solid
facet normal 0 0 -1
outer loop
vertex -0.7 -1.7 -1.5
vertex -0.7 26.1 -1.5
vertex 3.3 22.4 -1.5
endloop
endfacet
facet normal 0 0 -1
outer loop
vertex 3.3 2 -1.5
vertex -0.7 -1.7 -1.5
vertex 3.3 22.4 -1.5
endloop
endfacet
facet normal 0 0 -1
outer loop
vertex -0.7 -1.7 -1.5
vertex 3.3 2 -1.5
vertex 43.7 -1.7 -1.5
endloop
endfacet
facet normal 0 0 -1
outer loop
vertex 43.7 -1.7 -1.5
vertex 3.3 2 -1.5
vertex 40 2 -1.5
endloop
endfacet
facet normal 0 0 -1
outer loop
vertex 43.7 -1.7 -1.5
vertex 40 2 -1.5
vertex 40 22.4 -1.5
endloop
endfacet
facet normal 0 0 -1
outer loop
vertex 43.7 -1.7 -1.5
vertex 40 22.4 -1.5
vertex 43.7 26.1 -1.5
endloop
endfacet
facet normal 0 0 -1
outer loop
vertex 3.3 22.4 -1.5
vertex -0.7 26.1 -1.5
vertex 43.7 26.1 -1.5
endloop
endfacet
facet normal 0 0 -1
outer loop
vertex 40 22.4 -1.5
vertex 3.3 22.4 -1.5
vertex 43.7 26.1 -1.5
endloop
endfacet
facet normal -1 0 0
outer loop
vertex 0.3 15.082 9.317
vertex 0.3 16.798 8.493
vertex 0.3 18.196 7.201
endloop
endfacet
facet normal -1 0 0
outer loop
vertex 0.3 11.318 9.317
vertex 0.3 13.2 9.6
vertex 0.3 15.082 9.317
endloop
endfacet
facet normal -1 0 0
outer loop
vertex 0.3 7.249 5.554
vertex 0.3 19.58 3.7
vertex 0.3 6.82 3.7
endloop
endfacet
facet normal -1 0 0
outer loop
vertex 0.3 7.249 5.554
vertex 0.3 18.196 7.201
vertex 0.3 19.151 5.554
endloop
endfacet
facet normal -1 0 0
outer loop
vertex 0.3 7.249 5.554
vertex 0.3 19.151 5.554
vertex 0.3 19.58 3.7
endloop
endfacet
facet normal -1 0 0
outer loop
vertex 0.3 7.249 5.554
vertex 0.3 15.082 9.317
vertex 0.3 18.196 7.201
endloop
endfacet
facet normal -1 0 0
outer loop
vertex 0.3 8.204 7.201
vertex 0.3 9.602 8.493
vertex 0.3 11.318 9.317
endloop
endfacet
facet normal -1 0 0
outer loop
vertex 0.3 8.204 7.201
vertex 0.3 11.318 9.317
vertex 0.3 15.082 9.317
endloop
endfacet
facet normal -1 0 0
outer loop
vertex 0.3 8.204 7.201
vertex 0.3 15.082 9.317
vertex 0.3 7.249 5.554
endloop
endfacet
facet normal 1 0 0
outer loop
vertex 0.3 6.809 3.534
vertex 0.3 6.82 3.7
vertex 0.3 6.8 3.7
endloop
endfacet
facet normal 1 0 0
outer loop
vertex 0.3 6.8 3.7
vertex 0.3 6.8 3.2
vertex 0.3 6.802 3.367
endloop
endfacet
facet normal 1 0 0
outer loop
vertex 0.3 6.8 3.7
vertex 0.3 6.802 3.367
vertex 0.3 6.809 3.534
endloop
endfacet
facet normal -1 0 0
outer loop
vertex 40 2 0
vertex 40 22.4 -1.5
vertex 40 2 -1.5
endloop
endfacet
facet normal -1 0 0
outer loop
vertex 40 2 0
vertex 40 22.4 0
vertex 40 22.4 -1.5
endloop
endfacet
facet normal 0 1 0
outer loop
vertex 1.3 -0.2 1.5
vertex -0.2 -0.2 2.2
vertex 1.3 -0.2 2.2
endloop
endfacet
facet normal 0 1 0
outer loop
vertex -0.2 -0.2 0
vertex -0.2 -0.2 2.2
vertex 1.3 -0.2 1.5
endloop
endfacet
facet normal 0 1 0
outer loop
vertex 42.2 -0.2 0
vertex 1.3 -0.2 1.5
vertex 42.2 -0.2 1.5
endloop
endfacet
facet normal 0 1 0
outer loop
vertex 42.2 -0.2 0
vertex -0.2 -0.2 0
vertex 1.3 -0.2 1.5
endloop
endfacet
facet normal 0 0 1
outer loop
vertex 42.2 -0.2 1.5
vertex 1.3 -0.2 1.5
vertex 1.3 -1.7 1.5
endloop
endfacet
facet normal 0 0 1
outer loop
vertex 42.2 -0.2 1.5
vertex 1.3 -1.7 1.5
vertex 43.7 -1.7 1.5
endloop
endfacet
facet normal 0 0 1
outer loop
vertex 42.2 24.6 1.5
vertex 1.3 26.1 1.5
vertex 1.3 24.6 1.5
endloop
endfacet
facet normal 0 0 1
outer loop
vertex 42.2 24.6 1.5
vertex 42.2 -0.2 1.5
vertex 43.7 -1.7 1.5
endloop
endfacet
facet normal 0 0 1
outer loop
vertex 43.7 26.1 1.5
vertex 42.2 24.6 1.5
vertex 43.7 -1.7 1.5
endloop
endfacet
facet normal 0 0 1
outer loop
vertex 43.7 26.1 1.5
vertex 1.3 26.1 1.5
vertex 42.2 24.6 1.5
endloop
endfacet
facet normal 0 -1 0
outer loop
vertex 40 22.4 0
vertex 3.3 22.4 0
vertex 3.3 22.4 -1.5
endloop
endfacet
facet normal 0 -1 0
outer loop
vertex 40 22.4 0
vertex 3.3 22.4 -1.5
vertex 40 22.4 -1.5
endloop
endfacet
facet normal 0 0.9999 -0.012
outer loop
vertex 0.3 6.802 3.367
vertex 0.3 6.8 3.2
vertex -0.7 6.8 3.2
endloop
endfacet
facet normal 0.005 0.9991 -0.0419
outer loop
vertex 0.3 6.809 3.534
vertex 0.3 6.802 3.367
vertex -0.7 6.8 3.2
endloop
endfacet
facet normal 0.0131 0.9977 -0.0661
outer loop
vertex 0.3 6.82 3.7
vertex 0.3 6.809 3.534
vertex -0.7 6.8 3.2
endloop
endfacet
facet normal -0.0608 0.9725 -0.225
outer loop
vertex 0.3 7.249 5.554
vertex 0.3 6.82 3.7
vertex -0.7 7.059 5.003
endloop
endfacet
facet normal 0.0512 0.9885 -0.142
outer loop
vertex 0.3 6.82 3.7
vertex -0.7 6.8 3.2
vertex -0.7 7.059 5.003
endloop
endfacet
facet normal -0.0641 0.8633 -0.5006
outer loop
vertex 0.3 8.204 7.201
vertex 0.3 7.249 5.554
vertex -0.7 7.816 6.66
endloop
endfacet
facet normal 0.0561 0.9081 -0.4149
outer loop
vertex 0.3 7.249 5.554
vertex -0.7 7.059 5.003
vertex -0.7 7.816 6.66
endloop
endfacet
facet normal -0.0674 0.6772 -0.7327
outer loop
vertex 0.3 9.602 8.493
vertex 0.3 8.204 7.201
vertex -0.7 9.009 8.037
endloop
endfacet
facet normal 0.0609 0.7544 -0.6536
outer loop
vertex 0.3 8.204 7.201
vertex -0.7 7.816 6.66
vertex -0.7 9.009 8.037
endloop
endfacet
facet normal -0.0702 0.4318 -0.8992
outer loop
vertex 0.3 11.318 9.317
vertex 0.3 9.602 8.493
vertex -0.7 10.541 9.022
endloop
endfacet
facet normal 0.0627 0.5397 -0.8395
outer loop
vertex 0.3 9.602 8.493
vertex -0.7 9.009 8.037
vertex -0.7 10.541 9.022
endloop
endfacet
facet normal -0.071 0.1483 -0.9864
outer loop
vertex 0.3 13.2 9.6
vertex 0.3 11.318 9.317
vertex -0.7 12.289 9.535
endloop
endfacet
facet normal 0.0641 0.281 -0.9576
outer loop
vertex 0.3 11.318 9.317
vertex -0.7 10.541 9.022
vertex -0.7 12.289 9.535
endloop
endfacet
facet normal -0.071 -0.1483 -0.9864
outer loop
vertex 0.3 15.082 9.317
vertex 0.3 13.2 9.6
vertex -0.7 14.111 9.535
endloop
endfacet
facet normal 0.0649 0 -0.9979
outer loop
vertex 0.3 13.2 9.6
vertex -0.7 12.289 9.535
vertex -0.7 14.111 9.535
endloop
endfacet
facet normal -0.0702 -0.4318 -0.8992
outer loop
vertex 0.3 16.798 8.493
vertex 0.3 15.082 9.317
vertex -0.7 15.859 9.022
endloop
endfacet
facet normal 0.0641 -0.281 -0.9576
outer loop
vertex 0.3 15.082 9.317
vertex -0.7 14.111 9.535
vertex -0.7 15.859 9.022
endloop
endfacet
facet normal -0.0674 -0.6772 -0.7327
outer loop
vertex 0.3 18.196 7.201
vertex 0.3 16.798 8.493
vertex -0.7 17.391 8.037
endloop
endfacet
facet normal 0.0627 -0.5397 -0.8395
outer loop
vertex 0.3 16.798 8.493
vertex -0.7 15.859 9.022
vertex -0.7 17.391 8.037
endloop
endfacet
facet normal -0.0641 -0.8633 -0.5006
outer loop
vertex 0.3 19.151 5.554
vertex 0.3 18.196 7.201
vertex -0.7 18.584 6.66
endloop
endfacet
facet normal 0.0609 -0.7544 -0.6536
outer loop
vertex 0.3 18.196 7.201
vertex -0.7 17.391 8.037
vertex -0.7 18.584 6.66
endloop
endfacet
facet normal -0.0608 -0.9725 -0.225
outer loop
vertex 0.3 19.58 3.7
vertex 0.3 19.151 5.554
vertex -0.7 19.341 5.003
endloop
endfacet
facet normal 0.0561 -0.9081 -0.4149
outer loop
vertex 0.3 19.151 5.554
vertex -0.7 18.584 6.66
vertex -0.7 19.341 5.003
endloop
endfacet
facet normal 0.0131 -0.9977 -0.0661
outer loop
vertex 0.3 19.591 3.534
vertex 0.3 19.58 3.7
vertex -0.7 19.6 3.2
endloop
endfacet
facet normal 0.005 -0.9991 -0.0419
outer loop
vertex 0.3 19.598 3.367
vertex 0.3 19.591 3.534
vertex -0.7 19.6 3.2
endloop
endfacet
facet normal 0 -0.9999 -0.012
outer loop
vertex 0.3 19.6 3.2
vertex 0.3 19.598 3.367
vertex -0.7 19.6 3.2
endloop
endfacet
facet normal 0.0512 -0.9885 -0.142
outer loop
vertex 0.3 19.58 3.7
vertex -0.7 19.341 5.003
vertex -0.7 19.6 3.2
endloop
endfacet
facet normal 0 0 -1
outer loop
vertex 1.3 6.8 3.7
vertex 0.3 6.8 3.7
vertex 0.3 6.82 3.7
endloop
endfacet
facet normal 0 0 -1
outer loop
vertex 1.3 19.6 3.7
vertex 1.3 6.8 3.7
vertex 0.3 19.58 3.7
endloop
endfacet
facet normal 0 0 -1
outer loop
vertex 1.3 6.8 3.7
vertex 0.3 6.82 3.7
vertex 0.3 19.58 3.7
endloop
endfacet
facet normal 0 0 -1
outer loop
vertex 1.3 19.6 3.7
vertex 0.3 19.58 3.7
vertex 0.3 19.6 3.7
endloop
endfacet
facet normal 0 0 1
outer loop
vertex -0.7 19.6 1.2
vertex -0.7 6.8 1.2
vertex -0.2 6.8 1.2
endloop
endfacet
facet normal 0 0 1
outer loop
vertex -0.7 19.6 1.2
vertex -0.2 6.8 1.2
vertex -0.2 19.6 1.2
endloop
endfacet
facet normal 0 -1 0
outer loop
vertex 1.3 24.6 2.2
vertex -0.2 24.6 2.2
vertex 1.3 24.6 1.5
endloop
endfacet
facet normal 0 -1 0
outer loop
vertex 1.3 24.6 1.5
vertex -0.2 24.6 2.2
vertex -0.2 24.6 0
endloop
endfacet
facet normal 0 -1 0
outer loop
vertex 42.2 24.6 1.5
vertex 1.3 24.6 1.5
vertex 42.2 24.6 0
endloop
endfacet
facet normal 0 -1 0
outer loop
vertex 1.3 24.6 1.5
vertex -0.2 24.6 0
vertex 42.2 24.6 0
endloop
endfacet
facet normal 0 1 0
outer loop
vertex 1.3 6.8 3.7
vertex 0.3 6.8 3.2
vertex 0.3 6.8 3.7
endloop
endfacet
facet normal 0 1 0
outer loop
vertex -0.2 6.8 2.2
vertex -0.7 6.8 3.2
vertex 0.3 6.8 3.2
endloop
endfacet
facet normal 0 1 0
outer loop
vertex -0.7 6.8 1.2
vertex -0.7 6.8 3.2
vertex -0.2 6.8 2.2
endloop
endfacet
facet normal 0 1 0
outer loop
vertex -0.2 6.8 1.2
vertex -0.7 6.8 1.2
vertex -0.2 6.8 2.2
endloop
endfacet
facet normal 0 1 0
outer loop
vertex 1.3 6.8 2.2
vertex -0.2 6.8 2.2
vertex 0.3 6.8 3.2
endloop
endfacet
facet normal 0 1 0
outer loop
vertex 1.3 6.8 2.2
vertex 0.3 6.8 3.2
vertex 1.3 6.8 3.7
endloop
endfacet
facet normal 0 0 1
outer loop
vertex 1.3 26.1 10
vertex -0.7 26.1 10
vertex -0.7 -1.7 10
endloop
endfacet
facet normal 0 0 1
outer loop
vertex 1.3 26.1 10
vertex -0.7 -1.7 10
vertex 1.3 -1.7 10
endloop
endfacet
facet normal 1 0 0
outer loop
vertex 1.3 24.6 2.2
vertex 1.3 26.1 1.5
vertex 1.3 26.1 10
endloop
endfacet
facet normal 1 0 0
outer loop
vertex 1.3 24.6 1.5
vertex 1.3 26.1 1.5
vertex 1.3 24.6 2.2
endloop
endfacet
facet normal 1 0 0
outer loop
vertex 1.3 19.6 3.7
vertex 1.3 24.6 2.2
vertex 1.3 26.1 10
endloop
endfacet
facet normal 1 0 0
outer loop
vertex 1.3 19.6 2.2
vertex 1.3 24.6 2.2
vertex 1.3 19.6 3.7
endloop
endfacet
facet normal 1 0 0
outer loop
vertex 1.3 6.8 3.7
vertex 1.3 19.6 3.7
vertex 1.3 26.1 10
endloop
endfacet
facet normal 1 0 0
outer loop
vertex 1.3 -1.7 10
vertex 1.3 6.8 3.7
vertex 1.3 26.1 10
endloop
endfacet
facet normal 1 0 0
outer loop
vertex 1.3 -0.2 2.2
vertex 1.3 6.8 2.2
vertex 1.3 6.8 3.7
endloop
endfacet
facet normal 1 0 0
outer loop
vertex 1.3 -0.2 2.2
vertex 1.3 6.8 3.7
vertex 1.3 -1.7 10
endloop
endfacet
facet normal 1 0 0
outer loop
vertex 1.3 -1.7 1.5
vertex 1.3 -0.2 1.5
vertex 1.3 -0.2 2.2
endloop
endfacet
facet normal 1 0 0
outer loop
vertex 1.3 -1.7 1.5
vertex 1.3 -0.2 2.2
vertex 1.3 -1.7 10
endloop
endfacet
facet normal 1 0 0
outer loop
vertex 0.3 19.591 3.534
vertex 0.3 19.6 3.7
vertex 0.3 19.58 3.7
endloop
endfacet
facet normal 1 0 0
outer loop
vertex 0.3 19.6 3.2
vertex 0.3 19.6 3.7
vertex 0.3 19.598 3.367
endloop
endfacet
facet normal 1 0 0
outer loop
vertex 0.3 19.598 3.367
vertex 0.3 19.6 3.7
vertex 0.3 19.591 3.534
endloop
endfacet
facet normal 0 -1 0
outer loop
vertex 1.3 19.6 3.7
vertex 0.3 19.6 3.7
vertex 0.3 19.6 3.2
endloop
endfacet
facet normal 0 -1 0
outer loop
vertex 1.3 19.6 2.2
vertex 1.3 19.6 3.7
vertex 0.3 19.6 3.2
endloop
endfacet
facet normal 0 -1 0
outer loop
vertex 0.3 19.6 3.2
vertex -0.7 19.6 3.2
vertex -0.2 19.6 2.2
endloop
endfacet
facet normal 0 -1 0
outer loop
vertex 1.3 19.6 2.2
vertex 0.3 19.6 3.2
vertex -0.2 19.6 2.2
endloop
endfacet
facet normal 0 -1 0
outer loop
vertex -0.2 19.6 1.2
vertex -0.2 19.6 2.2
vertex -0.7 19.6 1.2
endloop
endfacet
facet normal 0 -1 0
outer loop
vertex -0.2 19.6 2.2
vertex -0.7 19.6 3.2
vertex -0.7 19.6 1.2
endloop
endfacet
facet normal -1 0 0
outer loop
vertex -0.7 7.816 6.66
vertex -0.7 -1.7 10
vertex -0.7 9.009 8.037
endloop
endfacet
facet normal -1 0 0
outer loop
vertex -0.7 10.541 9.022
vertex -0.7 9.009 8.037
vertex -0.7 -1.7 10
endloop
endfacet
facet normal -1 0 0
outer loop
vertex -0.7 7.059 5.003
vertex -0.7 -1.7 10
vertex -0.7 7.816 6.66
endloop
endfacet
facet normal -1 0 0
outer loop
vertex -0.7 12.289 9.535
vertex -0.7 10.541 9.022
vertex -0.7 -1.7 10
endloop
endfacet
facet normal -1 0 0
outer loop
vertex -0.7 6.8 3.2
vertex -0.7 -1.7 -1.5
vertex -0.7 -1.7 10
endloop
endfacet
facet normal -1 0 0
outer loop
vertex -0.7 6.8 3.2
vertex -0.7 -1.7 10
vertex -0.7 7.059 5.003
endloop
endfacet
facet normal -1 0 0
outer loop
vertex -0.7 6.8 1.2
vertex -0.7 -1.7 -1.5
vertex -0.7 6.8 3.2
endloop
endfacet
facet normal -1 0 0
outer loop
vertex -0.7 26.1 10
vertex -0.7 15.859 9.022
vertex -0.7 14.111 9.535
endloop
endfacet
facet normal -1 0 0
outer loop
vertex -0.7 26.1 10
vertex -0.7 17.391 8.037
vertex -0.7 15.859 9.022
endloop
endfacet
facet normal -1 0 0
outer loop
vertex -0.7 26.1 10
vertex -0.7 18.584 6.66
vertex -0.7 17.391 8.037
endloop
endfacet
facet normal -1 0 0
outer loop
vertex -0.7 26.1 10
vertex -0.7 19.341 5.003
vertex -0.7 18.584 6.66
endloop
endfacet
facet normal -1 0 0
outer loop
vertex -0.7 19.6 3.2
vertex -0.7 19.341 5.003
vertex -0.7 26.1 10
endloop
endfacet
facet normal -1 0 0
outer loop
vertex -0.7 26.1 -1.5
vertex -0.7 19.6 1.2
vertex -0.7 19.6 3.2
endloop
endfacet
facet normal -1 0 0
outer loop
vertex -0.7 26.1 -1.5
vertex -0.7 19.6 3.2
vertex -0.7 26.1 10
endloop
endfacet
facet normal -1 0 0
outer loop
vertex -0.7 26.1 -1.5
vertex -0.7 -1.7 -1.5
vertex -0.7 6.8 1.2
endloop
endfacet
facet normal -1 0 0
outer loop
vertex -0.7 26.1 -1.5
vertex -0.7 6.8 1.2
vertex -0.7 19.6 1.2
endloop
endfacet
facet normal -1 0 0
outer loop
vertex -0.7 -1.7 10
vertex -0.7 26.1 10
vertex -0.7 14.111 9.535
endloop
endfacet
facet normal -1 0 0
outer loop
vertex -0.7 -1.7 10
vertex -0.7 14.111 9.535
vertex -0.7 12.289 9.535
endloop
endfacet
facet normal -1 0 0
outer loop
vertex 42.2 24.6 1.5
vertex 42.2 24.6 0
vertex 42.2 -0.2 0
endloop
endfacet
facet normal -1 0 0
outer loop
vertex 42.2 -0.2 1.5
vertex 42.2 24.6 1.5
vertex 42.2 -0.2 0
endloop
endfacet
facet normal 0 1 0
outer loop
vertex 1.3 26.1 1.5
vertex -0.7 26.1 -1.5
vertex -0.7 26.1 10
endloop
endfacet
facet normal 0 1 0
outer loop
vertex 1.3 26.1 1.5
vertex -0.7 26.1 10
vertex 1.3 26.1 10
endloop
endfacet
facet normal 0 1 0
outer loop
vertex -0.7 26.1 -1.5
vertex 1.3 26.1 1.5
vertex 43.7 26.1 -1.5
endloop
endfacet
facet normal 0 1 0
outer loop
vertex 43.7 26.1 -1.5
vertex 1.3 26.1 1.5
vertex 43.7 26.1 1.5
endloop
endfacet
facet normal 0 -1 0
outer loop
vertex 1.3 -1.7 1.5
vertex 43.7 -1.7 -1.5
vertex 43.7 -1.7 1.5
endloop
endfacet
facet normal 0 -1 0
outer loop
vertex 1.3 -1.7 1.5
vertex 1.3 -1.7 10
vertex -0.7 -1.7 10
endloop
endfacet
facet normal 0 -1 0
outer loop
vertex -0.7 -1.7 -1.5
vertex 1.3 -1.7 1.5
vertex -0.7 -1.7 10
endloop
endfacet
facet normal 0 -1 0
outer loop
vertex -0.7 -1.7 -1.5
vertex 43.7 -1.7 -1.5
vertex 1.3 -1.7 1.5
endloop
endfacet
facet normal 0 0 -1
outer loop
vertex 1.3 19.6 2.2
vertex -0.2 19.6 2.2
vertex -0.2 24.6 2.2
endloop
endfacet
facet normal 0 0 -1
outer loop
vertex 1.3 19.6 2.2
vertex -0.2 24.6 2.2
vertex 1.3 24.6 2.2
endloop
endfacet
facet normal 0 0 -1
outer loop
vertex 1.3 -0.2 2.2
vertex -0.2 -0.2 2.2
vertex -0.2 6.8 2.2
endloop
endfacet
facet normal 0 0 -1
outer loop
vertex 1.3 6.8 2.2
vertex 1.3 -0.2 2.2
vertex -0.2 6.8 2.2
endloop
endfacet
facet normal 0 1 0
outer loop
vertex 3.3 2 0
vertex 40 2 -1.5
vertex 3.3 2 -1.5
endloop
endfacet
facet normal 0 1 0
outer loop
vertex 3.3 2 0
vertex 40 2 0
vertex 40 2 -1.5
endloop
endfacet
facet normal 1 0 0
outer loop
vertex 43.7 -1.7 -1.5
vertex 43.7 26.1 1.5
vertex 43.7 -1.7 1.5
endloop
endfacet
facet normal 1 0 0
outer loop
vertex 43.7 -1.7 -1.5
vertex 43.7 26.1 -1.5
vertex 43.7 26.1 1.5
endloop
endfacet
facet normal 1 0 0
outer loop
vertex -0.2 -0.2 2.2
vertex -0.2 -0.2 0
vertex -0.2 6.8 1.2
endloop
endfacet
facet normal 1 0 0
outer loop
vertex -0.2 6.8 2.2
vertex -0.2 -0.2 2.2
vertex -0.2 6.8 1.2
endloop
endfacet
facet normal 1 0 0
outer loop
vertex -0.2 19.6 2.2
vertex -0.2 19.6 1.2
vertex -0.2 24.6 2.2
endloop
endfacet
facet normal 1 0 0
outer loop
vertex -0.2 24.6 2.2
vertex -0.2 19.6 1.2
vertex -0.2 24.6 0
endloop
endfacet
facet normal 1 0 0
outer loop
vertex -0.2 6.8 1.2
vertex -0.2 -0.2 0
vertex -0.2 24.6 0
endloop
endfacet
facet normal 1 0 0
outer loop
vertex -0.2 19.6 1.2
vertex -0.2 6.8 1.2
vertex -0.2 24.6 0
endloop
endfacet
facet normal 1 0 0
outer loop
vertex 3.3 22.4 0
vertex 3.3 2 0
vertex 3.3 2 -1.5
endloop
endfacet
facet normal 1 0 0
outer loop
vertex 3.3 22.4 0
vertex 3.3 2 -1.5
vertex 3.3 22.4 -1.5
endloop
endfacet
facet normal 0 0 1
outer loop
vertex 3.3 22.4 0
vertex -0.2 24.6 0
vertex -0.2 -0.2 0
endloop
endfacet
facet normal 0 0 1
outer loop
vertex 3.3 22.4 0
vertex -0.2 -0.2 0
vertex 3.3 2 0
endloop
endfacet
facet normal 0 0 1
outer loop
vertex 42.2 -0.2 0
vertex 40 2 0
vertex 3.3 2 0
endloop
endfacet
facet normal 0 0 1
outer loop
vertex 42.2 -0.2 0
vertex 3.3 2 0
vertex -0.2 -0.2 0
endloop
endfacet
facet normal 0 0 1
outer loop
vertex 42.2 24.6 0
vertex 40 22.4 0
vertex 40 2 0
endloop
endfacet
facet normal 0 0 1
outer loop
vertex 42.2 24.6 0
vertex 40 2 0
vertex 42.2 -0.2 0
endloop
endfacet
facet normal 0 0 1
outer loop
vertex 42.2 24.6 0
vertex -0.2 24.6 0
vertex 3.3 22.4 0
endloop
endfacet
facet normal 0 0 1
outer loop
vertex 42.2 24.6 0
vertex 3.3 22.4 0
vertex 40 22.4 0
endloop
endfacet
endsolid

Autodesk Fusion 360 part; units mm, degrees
sketch "Sketch1" plane through (0, 0, 0) normal (0, 0, 1) x (1, 0, 0)
  line L0 (0, 0) -> (42, 0)
  line L1 (42, 0) -> (42, 24.4)
  line L2 (42, 24.4) -> (0, 24.4)
  line L3 (0, 24.4) -> (0, 0)
  line L4 (-0.2, 24.6) -> (42.2, 24.6)
  line L5 (42.2, 24.6) -> (42.2, -0.2)
  line L6 (42.2, -0.2) -> (-0.2, -0.2)
  line L7 (-0.2, -0.2) -> (-0.2, 24.6)
  line L8 (-0.7, 26.1) -> (43.7, 26.1)
  line L9 (43.7, 26.1) -> (43.7, -1.7)
  line L10 (43.7, -1.7) -> (-0.7, -1.7)
  line L11 (-0.7, -1.7) -> (-0.7, 26.1)
  line L12 (-0.7, 26.1) -> (1.3, 26.1)
  line L13 (1.3, 26.1) -> (1.3, -1.7)
  line L14 (1.3, -1.7) -> (-0.7, -1.7)
  line L15 (-0.7, -1.7) -> (-0.7, 26.1)
  line L16 (3.3, 22.4) -> (40, 22.4)
  line L17 (40, 22.4) -> (40, 2)
  line L18 (40, 2) -> (3.3, 2)
  line L19 (3.3, 2) -> (3.3, 22.4)
  dimension "d1" = 42
  dimension "d2" = 24.4
  dimension "d3" = 0.2
  dimension "d4" = 0.2
  dimension "d5" = 0.2
  dimension "d6" = 0.2
  dimension "d7" = 0.5
  dimension "d8" = 1.5
  dimension "d9" = 1.5
  dimension "d10" = 1.5
  dimension "d11" = 2
  dimension "d12" = 27.8
  dimension "d13" = 2
  dimension "d14" = 2
  dimension "d15" = 2
  dimension "d16" = 2
extrude "Extrude1" add sketch "Sketch1" against normal blind 1.5
extrude "Extrude2" add sketch "Sketch1" along normal blind 1.5 contours L4 L5 L6 L8 L9 L10 L13
extrude "Extrude3" add sketch "Sketch1" along normal blind 10 contours L4 L6 L7 L8 L10 L11 L12 L13 L14 L15
sketch "Sketch2" plane through (-0.7, 0, 0) normal (-1, 0, 0) x (0, -1, 0)
  line L0 (-26.1, 10) -> (-26.1, -1.5)
  line L1 (-26.1, -1.5) -> (1.7, -1.5)
  line L2 (1.7, -1.5) -> (1.7, 10)
  line L3 (1.7, 10) -> (-26.1, 10)
  line L4 (-24.4, 0) -> (0, 0)
  line L5 (0, 0) -> (0, 1.2)
  line L6 (0, 1.2) -> (-24.4, 1.2)
  line L7 (-24.4, 1.2) -> (-24.4, 0)
  line L8 (-19.6, 1.2) -> (-4.8, 1.2)
  line L9 (-4.8, 1.2) -> (-4.8, 3.2)
  line L10 (-4.8, 3.2) -> (-19.6, 3.2)
  line L11 (-19.6, 3.2) -> (-19.6, 1.2)
  line L12 (-4.8, 3.2) -> (-6.8, 3.2)
  line L13 (-6.8, 3.2) -> (-6.8, 1.2)
  line L14 (-6.8, 1.2) -> (-4.8, 1.2)
  line L15 (-4.8, 1.2) -> (-4.8, 3.2)
  circle A0 centre (-13.2, 3.2) radius 6.4
  dimension "d23" = 24.4
  dimension "d24" = 1.2
  dimension "d25" = 1.7
  dimension "d26" = 14.8
  dimension "d27" = 2
  dimension "d28" = 4.8
  dimension "d29" = 2
  dimension "d30" = 2
  dimension "d31" = 12.8
  dimension "d32" = 6.4
extrude "Extrude4" add sketch "Sketch2" against normal blind 2 contours L0 L1 L2 L3 L4 L5 L6 L7 L9 L10 L11 L12 L15 A0 | L1 L4 A0 | L10 A0 | L6 L8 L9 L10 L12 L13 L14 L15
extrude "Extrude5" cut sketch "Sketch2" against normal blind 1 contours L6 L8 L10 A0 | L6 L8 L11 A0 | L6 L8 L13 A0 | L10 A0
extrude "Extrude6" cut 1 faces at (0.3, 24.4, 0.8) along direction (0, 1, 0) blind 0.2
extrude "Extrude7" cut 1 faces at (0.3, 0, 0.4) along direction (0, -1, 0) blind 0.2
extrude "Extrude8" cut 2 faces at (0.8, 4.4667, 1.2) (0.8, 22.9333, 1.2) along direction (0, 0, 1) blind 0.5
extrude "Extrude9" cut 1 faces at (0.9667, 11.0667, 3.2) along direction (0, 0, 1) blind 0.5
extrude "Extrude10" cut 2 faces at (0.8, 4.4667, 1.7) (0.8, 22.9333, 1.7) along direction (0, 0, 1) blind 0.5
equation "d25 = ( 3.4 / 2 ) * 1 mm"
equation "d28 = ( 9.6 / 2 ) * 1 mm"
